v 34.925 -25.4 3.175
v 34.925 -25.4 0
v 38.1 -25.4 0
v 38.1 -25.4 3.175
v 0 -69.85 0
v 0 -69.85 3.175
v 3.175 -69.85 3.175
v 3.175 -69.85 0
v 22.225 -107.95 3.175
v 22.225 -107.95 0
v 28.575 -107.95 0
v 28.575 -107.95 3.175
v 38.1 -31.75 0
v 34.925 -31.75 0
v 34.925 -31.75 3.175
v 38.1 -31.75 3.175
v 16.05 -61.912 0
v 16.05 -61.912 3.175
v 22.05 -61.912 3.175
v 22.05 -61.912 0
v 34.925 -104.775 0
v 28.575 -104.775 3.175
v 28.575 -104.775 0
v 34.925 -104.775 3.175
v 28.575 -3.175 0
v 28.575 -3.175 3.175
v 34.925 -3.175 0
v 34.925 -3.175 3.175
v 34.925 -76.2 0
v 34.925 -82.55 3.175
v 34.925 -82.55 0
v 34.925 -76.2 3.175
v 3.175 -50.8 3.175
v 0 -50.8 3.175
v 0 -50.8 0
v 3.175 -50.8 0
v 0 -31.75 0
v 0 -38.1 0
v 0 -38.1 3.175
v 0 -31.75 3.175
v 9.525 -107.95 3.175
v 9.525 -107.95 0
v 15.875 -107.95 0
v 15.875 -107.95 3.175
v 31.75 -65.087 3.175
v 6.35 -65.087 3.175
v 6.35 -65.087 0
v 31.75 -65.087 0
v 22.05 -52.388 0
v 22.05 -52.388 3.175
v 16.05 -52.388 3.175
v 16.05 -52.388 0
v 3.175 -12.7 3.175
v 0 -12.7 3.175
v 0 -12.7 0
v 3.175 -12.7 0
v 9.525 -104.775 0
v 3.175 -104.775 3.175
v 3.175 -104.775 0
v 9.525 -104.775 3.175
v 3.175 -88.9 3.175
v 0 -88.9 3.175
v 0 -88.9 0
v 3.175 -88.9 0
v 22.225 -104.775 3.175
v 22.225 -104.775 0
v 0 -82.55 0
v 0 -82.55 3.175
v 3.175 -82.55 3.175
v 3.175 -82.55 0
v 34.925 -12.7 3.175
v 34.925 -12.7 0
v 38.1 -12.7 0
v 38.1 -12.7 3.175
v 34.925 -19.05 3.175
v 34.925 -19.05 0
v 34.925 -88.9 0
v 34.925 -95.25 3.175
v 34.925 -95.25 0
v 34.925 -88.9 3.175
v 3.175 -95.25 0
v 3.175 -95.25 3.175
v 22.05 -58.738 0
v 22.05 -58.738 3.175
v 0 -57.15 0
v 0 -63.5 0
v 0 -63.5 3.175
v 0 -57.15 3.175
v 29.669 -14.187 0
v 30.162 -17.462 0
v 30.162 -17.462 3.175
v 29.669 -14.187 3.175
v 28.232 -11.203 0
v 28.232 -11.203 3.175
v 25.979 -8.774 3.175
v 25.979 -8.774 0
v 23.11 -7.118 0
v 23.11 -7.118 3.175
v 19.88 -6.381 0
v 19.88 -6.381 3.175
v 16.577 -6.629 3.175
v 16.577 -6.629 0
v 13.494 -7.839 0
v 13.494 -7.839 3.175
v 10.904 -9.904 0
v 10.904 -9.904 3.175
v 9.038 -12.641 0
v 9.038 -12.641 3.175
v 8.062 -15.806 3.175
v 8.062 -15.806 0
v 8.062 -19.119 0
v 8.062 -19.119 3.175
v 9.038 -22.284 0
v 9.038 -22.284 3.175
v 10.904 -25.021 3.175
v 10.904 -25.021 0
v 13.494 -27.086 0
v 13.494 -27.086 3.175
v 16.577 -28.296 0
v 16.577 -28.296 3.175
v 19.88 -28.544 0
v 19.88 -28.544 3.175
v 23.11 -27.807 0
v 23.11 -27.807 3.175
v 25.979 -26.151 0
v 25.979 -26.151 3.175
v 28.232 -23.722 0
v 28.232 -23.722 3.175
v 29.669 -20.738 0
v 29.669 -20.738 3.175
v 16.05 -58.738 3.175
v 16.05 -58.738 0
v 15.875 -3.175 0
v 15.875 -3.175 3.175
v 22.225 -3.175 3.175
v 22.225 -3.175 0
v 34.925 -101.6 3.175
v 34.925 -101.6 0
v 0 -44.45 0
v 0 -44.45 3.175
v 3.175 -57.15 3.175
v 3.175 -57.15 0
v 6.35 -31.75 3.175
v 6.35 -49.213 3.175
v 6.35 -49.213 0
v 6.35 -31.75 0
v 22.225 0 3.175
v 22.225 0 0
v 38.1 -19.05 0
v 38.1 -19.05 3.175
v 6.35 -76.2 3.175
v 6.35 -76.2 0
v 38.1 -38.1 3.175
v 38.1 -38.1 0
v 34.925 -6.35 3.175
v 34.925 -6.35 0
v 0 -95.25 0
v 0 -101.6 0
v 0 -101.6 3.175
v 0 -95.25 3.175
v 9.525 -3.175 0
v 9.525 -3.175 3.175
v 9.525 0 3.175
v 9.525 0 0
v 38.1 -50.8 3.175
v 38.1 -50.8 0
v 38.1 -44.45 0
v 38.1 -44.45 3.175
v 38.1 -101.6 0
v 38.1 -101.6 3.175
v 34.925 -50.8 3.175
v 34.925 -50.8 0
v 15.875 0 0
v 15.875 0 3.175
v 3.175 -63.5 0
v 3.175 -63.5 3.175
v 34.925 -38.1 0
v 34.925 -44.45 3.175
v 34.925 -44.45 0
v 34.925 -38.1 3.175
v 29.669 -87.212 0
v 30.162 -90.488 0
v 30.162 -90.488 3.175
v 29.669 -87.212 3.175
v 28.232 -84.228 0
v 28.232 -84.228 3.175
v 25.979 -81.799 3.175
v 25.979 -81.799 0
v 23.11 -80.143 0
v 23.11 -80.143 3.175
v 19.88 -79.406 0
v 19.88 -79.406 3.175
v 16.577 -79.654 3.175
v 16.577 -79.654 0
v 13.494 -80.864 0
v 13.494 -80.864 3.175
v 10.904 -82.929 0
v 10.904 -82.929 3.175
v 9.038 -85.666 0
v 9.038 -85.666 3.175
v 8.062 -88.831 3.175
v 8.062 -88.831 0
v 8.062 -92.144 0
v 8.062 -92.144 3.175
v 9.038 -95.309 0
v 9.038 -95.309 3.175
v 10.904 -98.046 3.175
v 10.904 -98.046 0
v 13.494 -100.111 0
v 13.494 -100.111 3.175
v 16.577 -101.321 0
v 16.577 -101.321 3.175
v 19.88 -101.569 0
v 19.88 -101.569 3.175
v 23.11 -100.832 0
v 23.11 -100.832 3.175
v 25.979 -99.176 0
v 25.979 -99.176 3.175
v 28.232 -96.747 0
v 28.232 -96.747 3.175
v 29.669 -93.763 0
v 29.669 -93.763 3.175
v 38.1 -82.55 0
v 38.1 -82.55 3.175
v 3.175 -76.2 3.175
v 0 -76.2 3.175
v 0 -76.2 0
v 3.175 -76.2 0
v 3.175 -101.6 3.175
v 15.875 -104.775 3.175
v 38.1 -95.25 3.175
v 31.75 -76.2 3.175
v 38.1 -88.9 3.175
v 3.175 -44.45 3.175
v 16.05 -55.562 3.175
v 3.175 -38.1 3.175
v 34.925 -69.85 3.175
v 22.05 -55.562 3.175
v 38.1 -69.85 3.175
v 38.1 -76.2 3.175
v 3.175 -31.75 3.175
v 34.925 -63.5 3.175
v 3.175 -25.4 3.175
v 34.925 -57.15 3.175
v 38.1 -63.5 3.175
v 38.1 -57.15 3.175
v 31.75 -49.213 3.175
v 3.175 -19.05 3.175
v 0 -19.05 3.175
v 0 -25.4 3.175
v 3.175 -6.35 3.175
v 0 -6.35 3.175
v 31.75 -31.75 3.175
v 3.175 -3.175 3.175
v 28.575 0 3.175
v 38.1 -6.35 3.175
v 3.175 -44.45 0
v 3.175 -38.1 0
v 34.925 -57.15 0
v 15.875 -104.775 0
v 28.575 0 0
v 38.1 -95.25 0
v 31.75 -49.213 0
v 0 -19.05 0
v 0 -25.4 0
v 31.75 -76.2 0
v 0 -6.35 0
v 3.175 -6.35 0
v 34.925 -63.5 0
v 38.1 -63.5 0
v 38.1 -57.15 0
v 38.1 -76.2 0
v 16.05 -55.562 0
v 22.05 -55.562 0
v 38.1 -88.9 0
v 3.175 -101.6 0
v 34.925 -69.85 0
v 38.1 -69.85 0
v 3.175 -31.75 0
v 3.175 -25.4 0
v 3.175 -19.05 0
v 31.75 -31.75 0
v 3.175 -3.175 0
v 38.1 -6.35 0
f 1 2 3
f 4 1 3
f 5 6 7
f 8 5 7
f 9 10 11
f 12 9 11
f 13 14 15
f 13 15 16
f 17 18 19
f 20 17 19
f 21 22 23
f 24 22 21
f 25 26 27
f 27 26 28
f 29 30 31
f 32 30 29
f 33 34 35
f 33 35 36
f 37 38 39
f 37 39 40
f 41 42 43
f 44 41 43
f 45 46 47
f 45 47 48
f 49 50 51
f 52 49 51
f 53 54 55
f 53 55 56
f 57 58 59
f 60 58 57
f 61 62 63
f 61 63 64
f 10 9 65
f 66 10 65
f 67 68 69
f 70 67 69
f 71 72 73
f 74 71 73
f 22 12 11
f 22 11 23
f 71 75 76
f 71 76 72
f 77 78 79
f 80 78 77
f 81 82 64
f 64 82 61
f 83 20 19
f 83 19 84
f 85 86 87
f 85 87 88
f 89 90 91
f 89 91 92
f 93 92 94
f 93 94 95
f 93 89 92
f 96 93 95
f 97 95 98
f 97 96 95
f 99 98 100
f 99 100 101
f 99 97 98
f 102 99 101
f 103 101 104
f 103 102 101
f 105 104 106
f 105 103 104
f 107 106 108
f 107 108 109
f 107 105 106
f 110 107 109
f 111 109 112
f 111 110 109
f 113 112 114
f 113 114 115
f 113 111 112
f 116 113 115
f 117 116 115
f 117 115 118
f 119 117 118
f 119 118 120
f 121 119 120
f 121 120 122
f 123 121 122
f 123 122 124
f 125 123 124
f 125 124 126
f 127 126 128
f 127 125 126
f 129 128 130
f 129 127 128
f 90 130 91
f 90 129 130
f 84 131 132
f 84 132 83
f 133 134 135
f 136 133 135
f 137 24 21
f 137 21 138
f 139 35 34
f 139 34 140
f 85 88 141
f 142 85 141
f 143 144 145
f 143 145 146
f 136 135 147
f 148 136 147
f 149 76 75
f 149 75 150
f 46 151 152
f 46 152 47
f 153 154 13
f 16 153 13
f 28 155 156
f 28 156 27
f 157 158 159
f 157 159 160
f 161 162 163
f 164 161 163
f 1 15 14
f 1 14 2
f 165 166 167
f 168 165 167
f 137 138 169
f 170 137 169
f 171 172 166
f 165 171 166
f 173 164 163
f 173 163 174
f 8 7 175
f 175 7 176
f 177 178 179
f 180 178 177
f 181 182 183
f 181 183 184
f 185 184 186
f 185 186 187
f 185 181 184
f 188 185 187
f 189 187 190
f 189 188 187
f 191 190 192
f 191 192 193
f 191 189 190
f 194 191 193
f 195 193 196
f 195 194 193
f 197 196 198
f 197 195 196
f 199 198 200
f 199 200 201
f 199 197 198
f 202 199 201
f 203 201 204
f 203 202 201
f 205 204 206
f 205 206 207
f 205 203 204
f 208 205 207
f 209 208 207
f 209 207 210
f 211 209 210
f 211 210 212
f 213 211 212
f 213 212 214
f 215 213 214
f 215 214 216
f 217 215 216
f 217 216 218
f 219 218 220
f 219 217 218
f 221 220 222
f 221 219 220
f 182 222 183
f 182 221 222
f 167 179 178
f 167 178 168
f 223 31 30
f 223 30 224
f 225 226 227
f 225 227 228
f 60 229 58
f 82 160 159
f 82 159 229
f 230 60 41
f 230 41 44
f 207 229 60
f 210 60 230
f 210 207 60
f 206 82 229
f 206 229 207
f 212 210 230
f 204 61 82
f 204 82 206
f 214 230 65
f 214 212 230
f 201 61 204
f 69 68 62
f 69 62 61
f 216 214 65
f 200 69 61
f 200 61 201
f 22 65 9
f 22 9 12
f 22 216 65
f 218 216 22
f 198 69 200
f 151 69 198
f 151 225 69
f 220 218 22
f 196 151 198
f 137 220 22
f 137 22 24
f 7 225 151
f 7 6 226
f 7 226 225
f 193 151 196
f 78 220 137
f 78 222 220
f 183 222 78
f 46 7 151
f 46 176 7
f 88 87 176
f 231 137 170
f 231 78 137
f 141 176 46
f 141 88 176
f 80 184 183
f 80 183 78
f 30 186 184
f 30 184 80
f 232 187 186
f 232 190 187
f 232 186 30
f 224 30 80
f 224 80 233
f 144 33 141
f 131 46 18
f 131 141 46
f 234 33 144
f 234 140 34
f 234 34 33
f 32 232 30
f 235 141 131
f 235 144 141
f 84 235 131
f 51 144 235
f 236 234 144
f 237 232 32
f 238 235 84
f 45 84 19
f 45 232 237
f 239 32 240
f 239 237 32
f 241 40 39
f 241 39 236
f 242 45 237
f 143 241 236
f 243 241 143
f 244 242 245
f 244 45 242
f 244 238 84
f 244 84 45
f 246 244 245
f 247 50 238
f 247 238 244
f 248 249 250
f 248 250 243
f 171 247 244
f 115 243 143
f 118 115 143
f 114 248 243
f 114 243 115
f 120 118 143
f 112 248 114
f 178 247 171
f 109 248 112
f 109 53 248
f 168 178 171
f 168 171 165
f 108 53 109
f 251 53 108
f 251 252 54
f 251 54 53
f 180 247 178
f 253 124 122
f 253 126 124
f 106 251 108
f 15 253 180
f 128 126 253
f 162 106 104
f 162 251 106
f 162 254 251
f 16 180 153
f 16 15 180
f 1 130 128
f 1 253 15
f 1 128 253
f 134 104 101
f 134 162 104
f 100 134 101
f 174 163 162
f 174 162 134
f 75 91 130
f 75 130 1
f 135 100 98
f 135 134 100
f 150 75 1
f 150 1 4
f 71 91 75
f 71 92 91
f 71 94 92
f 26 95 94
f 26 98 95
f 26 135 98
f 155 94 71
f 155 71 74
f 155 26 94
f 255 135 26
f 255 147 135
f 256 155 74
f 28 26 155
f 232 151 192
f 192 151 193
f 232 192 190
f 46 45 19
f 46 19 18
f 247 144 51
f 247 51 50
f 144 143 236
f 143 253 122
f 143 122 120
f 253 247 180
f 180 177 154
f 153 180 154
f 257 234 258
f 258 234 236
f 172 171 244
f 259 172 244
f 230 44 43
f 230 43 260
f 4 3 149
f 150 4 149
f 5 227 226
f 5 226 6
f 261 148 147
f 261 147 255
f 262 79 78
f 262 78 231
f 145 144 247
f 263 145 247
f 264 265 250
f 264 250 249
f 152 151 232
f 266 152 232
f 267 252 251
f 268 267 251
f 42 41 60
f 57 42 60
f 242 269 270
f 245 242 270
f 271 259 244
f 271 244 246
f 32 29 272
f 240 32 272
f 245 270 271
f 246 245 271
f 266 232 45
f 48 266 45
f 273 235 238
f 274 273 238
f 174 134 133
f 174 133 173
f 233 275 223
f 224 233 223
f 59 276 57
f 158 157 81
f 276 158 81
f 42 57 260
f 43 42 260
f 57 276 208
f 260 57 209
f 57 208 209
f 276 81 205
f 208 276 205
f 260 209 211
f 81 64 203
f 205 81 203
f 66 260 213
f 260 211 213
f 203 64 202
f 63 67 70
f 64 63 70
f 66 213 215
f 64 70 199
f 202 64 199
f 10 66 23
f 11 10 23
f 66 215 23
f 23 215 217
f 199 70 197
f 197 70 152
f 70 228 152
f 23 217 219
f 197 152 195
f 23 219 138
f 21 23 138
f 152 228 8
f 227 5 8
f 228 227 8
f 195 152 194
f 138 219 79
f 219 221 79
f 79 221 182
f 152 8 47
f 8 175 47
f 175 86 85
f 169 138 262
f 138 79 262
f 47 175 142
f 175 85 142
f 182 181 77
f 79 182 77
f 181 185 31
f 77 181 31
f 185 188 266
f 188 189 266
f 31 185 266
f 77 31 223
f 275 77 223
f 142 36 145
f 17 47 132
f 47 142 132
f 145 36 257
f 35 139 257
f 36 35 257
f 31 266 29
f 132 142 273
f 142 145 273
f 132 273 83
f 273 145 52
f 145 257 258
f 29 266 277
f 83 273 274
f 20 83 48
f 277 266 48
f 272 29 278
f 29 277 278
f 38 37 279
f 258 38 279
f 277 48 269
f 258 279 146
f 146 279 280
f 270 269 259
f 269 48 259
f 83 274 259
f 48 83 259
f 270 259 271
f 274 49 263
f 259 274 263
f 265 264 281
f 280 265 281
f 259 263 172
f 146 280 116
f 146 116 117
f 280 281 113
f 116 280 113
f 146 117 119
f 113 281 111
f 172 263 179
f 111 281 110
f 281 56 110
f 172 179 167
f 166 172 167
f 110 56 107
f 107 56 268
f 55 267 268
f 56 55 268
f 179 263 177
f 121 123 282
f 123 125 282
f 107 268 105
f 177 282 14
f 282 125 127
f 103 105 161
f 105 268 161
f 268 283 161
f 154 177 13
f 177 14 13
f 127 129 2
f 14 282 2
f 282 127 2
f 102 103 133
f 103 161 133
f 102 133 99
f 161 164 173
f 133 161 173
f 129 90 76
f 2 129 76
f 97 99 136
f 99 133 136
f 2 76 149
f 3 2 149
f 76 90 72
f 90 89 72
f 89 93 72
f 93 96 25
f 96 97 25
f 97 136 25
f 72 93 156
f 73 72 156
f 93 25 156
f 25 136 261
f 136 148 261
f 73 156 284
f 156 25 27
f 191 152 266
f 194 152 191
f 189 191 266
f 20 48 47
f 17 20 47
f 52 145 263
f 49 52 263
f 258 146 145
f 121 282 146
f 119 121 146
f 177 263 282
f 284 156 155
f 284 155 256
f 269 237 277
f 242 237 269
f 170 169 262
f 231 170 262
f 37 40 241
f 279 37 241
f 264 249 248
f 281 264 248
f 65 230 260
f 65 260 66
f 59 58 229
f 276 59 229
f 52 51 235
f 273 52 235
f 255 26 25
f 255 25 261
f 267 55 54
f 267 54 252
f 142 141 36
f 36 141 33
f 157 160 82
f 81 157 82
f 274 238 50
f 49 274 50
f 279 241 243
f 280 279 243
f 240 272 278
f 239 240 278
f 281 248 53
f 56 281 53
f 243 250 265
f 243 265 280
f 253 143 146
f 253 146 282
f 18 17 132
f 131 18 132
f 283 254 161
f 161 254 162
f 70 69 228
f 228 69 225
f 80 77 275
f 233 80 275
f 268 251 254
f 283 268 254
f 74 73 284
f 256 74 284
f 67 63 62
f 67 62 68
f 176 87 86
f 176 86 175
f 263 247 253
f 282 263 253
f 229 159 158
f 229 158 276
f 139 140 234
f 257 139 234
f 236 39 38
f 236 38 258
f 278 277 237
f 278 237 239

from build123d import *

# Parameters (mm, degrees)
F0_W     = 38.1
F0_H     = 107.95
F0_R     = 11.1125
F1_DEPTH = 3.175
F2_W     = 3.175
F2_H     = 6.35
F2_H_2   = 3.175
F2_W_2   = 25.4
F2_H_3   = 17.4625
F2_W_3   = 6
F2_H_4   = 11.1125
F3_DEPTH = 3.175
F4_W     = 6.35
F4_H     = 3.175
F5_DEPTH = 3.175


with BuildPart() as f1:
    # F0 (on Top) → F1 (new body)
    with BuildSketch(Plane.XY):
        with Locations((19.05, -53.975)):
            Rectangle(F0_W, F0_H)
        with Locations((19.05, -90.4875)):
            Circle(F0_R, mode=Mode.SUBTRACT)
        with Locations((19.05, -17.4625)):
            Circle(F0_R, mode=Mode.SUBTRACT)
    extrude(amount=F1_DEPTH)

    # F2 (on face) → F3 (cut, through all)
    with BuildSketch(Plane.XY.offset(3.175)):
        with Locations((36.5125, -3.175)):
            Rectangle(F2_W, F2_H)
        with Locations((1.5875, -3.175)):
            Rectangle(F2_W, F2_H)
        with Locations((1.5875, -15.875)):
            Rectangle(F2_W, F2_H)
        with Locations((36.5125, -15.875)):
            Rectangle(F2_W, F2_H)
        with Locations((36.5125, -28.575)):
            Rectangle(F2_W, F2_H)
        with Locations((36.5125, -41.275)):
            Rectangle(F2_W, F2_H)
        Polygon((22.05, -55.5625), (22.05, -53.975), (22.05, -52.3875), (16.05, -52.3875), (16.05, -55.5625), align=None)
        with Locations((36.5125, -52.3875)):
            Rectangle(F2_W, F2_H_2)
        with Locations((36.5125, -55.5625)):
            Rectangle(F2_W, F2_H_2)
        with Locations((36.5125, -66.675)):
            Rectangle(F2_W, F2_H)
        with Locations((36.5125, -79.375)):
            Rectangle(F2_W, F2_H)
        with Locations((36.5125, -92.075)):
            Rectangle(F2_W, F2_H)
        with Locations((36.5125, -104.775)):
            Rectangle(F2_W, F2_H)
        with Locations((36.5125, -117.475)):
            Rectangle(F2_W, F2_H)
        with Locations((36.5125, -130.175)):
            Rectangle(F2_W, F2_H)
        with Locations((1.5875, -28.575)):
            Rectangle(F2_W, F2_H)
        with Locations((1.5875, -41.275)):
            Rectangle(F2_W, F2_H)
        with Locations((1.5875, -53.975)):
            Rectangle(F2_W, F2_H)
        with Locations((1.5875, -66.675)):
            Rectangle(F2_W, F2_H)
        with Locations((1.5875, -79.375)):
            Rectangle(F2_W, F2_H)
        with Locations((1.5875, -92.075)):
            Rectangle(F2_W, F2_H)
        with Locations((1.5875, -104.775)):
            Rectangle(F2_W, F2_H)
        with Locations((1.5875, -117.475)):
            Rectangle(F2_W, F2_H)
        with Locations((1.5875, -130.175)):
            Rectangle(F2_W, F2_H)
        with Locations((19.05, -40.48125)):
            Rectangle(F2_W_2, F2_H_3)
        with Locations((19.05, -60.325)):
            Rectangle(F2_W_3, F2_H_2)
        with Locations((19.05, -70.64375)):
            Rectangle(F2_W_2, F2_H_4)
    extrude(amount=-F3_DEPTH, mode=Mode.SUBTRACT)

    # F4 (on face) → F5 (cut, through all)
    with BuildSketch(Plane.XY.offset(3.175)):
        with Locations((19.05, -1.5875)):
            Rectangle(F4_W, F4_H)
        with Locations((31.75, -1.5875)):
            Rectangle(F4_W, F4_H)
        with Locations((6.35, -1.5875)):
            Rectangle(F4_W, F4_H)
        with Locations((31.75, -106.3625)):
            Rectangle(F4_W, F4_H)
        with Locations((6.35, -106.3625)):
            Rectangle(F4_W, F4_H)
        with Locations((19.05, -106.3625)):
            Rectangle(F4_W, F4_H)
    extrude(amount=-F5_DEPTH, mode=Mode.SUBTRACT)


solid = f1.part
